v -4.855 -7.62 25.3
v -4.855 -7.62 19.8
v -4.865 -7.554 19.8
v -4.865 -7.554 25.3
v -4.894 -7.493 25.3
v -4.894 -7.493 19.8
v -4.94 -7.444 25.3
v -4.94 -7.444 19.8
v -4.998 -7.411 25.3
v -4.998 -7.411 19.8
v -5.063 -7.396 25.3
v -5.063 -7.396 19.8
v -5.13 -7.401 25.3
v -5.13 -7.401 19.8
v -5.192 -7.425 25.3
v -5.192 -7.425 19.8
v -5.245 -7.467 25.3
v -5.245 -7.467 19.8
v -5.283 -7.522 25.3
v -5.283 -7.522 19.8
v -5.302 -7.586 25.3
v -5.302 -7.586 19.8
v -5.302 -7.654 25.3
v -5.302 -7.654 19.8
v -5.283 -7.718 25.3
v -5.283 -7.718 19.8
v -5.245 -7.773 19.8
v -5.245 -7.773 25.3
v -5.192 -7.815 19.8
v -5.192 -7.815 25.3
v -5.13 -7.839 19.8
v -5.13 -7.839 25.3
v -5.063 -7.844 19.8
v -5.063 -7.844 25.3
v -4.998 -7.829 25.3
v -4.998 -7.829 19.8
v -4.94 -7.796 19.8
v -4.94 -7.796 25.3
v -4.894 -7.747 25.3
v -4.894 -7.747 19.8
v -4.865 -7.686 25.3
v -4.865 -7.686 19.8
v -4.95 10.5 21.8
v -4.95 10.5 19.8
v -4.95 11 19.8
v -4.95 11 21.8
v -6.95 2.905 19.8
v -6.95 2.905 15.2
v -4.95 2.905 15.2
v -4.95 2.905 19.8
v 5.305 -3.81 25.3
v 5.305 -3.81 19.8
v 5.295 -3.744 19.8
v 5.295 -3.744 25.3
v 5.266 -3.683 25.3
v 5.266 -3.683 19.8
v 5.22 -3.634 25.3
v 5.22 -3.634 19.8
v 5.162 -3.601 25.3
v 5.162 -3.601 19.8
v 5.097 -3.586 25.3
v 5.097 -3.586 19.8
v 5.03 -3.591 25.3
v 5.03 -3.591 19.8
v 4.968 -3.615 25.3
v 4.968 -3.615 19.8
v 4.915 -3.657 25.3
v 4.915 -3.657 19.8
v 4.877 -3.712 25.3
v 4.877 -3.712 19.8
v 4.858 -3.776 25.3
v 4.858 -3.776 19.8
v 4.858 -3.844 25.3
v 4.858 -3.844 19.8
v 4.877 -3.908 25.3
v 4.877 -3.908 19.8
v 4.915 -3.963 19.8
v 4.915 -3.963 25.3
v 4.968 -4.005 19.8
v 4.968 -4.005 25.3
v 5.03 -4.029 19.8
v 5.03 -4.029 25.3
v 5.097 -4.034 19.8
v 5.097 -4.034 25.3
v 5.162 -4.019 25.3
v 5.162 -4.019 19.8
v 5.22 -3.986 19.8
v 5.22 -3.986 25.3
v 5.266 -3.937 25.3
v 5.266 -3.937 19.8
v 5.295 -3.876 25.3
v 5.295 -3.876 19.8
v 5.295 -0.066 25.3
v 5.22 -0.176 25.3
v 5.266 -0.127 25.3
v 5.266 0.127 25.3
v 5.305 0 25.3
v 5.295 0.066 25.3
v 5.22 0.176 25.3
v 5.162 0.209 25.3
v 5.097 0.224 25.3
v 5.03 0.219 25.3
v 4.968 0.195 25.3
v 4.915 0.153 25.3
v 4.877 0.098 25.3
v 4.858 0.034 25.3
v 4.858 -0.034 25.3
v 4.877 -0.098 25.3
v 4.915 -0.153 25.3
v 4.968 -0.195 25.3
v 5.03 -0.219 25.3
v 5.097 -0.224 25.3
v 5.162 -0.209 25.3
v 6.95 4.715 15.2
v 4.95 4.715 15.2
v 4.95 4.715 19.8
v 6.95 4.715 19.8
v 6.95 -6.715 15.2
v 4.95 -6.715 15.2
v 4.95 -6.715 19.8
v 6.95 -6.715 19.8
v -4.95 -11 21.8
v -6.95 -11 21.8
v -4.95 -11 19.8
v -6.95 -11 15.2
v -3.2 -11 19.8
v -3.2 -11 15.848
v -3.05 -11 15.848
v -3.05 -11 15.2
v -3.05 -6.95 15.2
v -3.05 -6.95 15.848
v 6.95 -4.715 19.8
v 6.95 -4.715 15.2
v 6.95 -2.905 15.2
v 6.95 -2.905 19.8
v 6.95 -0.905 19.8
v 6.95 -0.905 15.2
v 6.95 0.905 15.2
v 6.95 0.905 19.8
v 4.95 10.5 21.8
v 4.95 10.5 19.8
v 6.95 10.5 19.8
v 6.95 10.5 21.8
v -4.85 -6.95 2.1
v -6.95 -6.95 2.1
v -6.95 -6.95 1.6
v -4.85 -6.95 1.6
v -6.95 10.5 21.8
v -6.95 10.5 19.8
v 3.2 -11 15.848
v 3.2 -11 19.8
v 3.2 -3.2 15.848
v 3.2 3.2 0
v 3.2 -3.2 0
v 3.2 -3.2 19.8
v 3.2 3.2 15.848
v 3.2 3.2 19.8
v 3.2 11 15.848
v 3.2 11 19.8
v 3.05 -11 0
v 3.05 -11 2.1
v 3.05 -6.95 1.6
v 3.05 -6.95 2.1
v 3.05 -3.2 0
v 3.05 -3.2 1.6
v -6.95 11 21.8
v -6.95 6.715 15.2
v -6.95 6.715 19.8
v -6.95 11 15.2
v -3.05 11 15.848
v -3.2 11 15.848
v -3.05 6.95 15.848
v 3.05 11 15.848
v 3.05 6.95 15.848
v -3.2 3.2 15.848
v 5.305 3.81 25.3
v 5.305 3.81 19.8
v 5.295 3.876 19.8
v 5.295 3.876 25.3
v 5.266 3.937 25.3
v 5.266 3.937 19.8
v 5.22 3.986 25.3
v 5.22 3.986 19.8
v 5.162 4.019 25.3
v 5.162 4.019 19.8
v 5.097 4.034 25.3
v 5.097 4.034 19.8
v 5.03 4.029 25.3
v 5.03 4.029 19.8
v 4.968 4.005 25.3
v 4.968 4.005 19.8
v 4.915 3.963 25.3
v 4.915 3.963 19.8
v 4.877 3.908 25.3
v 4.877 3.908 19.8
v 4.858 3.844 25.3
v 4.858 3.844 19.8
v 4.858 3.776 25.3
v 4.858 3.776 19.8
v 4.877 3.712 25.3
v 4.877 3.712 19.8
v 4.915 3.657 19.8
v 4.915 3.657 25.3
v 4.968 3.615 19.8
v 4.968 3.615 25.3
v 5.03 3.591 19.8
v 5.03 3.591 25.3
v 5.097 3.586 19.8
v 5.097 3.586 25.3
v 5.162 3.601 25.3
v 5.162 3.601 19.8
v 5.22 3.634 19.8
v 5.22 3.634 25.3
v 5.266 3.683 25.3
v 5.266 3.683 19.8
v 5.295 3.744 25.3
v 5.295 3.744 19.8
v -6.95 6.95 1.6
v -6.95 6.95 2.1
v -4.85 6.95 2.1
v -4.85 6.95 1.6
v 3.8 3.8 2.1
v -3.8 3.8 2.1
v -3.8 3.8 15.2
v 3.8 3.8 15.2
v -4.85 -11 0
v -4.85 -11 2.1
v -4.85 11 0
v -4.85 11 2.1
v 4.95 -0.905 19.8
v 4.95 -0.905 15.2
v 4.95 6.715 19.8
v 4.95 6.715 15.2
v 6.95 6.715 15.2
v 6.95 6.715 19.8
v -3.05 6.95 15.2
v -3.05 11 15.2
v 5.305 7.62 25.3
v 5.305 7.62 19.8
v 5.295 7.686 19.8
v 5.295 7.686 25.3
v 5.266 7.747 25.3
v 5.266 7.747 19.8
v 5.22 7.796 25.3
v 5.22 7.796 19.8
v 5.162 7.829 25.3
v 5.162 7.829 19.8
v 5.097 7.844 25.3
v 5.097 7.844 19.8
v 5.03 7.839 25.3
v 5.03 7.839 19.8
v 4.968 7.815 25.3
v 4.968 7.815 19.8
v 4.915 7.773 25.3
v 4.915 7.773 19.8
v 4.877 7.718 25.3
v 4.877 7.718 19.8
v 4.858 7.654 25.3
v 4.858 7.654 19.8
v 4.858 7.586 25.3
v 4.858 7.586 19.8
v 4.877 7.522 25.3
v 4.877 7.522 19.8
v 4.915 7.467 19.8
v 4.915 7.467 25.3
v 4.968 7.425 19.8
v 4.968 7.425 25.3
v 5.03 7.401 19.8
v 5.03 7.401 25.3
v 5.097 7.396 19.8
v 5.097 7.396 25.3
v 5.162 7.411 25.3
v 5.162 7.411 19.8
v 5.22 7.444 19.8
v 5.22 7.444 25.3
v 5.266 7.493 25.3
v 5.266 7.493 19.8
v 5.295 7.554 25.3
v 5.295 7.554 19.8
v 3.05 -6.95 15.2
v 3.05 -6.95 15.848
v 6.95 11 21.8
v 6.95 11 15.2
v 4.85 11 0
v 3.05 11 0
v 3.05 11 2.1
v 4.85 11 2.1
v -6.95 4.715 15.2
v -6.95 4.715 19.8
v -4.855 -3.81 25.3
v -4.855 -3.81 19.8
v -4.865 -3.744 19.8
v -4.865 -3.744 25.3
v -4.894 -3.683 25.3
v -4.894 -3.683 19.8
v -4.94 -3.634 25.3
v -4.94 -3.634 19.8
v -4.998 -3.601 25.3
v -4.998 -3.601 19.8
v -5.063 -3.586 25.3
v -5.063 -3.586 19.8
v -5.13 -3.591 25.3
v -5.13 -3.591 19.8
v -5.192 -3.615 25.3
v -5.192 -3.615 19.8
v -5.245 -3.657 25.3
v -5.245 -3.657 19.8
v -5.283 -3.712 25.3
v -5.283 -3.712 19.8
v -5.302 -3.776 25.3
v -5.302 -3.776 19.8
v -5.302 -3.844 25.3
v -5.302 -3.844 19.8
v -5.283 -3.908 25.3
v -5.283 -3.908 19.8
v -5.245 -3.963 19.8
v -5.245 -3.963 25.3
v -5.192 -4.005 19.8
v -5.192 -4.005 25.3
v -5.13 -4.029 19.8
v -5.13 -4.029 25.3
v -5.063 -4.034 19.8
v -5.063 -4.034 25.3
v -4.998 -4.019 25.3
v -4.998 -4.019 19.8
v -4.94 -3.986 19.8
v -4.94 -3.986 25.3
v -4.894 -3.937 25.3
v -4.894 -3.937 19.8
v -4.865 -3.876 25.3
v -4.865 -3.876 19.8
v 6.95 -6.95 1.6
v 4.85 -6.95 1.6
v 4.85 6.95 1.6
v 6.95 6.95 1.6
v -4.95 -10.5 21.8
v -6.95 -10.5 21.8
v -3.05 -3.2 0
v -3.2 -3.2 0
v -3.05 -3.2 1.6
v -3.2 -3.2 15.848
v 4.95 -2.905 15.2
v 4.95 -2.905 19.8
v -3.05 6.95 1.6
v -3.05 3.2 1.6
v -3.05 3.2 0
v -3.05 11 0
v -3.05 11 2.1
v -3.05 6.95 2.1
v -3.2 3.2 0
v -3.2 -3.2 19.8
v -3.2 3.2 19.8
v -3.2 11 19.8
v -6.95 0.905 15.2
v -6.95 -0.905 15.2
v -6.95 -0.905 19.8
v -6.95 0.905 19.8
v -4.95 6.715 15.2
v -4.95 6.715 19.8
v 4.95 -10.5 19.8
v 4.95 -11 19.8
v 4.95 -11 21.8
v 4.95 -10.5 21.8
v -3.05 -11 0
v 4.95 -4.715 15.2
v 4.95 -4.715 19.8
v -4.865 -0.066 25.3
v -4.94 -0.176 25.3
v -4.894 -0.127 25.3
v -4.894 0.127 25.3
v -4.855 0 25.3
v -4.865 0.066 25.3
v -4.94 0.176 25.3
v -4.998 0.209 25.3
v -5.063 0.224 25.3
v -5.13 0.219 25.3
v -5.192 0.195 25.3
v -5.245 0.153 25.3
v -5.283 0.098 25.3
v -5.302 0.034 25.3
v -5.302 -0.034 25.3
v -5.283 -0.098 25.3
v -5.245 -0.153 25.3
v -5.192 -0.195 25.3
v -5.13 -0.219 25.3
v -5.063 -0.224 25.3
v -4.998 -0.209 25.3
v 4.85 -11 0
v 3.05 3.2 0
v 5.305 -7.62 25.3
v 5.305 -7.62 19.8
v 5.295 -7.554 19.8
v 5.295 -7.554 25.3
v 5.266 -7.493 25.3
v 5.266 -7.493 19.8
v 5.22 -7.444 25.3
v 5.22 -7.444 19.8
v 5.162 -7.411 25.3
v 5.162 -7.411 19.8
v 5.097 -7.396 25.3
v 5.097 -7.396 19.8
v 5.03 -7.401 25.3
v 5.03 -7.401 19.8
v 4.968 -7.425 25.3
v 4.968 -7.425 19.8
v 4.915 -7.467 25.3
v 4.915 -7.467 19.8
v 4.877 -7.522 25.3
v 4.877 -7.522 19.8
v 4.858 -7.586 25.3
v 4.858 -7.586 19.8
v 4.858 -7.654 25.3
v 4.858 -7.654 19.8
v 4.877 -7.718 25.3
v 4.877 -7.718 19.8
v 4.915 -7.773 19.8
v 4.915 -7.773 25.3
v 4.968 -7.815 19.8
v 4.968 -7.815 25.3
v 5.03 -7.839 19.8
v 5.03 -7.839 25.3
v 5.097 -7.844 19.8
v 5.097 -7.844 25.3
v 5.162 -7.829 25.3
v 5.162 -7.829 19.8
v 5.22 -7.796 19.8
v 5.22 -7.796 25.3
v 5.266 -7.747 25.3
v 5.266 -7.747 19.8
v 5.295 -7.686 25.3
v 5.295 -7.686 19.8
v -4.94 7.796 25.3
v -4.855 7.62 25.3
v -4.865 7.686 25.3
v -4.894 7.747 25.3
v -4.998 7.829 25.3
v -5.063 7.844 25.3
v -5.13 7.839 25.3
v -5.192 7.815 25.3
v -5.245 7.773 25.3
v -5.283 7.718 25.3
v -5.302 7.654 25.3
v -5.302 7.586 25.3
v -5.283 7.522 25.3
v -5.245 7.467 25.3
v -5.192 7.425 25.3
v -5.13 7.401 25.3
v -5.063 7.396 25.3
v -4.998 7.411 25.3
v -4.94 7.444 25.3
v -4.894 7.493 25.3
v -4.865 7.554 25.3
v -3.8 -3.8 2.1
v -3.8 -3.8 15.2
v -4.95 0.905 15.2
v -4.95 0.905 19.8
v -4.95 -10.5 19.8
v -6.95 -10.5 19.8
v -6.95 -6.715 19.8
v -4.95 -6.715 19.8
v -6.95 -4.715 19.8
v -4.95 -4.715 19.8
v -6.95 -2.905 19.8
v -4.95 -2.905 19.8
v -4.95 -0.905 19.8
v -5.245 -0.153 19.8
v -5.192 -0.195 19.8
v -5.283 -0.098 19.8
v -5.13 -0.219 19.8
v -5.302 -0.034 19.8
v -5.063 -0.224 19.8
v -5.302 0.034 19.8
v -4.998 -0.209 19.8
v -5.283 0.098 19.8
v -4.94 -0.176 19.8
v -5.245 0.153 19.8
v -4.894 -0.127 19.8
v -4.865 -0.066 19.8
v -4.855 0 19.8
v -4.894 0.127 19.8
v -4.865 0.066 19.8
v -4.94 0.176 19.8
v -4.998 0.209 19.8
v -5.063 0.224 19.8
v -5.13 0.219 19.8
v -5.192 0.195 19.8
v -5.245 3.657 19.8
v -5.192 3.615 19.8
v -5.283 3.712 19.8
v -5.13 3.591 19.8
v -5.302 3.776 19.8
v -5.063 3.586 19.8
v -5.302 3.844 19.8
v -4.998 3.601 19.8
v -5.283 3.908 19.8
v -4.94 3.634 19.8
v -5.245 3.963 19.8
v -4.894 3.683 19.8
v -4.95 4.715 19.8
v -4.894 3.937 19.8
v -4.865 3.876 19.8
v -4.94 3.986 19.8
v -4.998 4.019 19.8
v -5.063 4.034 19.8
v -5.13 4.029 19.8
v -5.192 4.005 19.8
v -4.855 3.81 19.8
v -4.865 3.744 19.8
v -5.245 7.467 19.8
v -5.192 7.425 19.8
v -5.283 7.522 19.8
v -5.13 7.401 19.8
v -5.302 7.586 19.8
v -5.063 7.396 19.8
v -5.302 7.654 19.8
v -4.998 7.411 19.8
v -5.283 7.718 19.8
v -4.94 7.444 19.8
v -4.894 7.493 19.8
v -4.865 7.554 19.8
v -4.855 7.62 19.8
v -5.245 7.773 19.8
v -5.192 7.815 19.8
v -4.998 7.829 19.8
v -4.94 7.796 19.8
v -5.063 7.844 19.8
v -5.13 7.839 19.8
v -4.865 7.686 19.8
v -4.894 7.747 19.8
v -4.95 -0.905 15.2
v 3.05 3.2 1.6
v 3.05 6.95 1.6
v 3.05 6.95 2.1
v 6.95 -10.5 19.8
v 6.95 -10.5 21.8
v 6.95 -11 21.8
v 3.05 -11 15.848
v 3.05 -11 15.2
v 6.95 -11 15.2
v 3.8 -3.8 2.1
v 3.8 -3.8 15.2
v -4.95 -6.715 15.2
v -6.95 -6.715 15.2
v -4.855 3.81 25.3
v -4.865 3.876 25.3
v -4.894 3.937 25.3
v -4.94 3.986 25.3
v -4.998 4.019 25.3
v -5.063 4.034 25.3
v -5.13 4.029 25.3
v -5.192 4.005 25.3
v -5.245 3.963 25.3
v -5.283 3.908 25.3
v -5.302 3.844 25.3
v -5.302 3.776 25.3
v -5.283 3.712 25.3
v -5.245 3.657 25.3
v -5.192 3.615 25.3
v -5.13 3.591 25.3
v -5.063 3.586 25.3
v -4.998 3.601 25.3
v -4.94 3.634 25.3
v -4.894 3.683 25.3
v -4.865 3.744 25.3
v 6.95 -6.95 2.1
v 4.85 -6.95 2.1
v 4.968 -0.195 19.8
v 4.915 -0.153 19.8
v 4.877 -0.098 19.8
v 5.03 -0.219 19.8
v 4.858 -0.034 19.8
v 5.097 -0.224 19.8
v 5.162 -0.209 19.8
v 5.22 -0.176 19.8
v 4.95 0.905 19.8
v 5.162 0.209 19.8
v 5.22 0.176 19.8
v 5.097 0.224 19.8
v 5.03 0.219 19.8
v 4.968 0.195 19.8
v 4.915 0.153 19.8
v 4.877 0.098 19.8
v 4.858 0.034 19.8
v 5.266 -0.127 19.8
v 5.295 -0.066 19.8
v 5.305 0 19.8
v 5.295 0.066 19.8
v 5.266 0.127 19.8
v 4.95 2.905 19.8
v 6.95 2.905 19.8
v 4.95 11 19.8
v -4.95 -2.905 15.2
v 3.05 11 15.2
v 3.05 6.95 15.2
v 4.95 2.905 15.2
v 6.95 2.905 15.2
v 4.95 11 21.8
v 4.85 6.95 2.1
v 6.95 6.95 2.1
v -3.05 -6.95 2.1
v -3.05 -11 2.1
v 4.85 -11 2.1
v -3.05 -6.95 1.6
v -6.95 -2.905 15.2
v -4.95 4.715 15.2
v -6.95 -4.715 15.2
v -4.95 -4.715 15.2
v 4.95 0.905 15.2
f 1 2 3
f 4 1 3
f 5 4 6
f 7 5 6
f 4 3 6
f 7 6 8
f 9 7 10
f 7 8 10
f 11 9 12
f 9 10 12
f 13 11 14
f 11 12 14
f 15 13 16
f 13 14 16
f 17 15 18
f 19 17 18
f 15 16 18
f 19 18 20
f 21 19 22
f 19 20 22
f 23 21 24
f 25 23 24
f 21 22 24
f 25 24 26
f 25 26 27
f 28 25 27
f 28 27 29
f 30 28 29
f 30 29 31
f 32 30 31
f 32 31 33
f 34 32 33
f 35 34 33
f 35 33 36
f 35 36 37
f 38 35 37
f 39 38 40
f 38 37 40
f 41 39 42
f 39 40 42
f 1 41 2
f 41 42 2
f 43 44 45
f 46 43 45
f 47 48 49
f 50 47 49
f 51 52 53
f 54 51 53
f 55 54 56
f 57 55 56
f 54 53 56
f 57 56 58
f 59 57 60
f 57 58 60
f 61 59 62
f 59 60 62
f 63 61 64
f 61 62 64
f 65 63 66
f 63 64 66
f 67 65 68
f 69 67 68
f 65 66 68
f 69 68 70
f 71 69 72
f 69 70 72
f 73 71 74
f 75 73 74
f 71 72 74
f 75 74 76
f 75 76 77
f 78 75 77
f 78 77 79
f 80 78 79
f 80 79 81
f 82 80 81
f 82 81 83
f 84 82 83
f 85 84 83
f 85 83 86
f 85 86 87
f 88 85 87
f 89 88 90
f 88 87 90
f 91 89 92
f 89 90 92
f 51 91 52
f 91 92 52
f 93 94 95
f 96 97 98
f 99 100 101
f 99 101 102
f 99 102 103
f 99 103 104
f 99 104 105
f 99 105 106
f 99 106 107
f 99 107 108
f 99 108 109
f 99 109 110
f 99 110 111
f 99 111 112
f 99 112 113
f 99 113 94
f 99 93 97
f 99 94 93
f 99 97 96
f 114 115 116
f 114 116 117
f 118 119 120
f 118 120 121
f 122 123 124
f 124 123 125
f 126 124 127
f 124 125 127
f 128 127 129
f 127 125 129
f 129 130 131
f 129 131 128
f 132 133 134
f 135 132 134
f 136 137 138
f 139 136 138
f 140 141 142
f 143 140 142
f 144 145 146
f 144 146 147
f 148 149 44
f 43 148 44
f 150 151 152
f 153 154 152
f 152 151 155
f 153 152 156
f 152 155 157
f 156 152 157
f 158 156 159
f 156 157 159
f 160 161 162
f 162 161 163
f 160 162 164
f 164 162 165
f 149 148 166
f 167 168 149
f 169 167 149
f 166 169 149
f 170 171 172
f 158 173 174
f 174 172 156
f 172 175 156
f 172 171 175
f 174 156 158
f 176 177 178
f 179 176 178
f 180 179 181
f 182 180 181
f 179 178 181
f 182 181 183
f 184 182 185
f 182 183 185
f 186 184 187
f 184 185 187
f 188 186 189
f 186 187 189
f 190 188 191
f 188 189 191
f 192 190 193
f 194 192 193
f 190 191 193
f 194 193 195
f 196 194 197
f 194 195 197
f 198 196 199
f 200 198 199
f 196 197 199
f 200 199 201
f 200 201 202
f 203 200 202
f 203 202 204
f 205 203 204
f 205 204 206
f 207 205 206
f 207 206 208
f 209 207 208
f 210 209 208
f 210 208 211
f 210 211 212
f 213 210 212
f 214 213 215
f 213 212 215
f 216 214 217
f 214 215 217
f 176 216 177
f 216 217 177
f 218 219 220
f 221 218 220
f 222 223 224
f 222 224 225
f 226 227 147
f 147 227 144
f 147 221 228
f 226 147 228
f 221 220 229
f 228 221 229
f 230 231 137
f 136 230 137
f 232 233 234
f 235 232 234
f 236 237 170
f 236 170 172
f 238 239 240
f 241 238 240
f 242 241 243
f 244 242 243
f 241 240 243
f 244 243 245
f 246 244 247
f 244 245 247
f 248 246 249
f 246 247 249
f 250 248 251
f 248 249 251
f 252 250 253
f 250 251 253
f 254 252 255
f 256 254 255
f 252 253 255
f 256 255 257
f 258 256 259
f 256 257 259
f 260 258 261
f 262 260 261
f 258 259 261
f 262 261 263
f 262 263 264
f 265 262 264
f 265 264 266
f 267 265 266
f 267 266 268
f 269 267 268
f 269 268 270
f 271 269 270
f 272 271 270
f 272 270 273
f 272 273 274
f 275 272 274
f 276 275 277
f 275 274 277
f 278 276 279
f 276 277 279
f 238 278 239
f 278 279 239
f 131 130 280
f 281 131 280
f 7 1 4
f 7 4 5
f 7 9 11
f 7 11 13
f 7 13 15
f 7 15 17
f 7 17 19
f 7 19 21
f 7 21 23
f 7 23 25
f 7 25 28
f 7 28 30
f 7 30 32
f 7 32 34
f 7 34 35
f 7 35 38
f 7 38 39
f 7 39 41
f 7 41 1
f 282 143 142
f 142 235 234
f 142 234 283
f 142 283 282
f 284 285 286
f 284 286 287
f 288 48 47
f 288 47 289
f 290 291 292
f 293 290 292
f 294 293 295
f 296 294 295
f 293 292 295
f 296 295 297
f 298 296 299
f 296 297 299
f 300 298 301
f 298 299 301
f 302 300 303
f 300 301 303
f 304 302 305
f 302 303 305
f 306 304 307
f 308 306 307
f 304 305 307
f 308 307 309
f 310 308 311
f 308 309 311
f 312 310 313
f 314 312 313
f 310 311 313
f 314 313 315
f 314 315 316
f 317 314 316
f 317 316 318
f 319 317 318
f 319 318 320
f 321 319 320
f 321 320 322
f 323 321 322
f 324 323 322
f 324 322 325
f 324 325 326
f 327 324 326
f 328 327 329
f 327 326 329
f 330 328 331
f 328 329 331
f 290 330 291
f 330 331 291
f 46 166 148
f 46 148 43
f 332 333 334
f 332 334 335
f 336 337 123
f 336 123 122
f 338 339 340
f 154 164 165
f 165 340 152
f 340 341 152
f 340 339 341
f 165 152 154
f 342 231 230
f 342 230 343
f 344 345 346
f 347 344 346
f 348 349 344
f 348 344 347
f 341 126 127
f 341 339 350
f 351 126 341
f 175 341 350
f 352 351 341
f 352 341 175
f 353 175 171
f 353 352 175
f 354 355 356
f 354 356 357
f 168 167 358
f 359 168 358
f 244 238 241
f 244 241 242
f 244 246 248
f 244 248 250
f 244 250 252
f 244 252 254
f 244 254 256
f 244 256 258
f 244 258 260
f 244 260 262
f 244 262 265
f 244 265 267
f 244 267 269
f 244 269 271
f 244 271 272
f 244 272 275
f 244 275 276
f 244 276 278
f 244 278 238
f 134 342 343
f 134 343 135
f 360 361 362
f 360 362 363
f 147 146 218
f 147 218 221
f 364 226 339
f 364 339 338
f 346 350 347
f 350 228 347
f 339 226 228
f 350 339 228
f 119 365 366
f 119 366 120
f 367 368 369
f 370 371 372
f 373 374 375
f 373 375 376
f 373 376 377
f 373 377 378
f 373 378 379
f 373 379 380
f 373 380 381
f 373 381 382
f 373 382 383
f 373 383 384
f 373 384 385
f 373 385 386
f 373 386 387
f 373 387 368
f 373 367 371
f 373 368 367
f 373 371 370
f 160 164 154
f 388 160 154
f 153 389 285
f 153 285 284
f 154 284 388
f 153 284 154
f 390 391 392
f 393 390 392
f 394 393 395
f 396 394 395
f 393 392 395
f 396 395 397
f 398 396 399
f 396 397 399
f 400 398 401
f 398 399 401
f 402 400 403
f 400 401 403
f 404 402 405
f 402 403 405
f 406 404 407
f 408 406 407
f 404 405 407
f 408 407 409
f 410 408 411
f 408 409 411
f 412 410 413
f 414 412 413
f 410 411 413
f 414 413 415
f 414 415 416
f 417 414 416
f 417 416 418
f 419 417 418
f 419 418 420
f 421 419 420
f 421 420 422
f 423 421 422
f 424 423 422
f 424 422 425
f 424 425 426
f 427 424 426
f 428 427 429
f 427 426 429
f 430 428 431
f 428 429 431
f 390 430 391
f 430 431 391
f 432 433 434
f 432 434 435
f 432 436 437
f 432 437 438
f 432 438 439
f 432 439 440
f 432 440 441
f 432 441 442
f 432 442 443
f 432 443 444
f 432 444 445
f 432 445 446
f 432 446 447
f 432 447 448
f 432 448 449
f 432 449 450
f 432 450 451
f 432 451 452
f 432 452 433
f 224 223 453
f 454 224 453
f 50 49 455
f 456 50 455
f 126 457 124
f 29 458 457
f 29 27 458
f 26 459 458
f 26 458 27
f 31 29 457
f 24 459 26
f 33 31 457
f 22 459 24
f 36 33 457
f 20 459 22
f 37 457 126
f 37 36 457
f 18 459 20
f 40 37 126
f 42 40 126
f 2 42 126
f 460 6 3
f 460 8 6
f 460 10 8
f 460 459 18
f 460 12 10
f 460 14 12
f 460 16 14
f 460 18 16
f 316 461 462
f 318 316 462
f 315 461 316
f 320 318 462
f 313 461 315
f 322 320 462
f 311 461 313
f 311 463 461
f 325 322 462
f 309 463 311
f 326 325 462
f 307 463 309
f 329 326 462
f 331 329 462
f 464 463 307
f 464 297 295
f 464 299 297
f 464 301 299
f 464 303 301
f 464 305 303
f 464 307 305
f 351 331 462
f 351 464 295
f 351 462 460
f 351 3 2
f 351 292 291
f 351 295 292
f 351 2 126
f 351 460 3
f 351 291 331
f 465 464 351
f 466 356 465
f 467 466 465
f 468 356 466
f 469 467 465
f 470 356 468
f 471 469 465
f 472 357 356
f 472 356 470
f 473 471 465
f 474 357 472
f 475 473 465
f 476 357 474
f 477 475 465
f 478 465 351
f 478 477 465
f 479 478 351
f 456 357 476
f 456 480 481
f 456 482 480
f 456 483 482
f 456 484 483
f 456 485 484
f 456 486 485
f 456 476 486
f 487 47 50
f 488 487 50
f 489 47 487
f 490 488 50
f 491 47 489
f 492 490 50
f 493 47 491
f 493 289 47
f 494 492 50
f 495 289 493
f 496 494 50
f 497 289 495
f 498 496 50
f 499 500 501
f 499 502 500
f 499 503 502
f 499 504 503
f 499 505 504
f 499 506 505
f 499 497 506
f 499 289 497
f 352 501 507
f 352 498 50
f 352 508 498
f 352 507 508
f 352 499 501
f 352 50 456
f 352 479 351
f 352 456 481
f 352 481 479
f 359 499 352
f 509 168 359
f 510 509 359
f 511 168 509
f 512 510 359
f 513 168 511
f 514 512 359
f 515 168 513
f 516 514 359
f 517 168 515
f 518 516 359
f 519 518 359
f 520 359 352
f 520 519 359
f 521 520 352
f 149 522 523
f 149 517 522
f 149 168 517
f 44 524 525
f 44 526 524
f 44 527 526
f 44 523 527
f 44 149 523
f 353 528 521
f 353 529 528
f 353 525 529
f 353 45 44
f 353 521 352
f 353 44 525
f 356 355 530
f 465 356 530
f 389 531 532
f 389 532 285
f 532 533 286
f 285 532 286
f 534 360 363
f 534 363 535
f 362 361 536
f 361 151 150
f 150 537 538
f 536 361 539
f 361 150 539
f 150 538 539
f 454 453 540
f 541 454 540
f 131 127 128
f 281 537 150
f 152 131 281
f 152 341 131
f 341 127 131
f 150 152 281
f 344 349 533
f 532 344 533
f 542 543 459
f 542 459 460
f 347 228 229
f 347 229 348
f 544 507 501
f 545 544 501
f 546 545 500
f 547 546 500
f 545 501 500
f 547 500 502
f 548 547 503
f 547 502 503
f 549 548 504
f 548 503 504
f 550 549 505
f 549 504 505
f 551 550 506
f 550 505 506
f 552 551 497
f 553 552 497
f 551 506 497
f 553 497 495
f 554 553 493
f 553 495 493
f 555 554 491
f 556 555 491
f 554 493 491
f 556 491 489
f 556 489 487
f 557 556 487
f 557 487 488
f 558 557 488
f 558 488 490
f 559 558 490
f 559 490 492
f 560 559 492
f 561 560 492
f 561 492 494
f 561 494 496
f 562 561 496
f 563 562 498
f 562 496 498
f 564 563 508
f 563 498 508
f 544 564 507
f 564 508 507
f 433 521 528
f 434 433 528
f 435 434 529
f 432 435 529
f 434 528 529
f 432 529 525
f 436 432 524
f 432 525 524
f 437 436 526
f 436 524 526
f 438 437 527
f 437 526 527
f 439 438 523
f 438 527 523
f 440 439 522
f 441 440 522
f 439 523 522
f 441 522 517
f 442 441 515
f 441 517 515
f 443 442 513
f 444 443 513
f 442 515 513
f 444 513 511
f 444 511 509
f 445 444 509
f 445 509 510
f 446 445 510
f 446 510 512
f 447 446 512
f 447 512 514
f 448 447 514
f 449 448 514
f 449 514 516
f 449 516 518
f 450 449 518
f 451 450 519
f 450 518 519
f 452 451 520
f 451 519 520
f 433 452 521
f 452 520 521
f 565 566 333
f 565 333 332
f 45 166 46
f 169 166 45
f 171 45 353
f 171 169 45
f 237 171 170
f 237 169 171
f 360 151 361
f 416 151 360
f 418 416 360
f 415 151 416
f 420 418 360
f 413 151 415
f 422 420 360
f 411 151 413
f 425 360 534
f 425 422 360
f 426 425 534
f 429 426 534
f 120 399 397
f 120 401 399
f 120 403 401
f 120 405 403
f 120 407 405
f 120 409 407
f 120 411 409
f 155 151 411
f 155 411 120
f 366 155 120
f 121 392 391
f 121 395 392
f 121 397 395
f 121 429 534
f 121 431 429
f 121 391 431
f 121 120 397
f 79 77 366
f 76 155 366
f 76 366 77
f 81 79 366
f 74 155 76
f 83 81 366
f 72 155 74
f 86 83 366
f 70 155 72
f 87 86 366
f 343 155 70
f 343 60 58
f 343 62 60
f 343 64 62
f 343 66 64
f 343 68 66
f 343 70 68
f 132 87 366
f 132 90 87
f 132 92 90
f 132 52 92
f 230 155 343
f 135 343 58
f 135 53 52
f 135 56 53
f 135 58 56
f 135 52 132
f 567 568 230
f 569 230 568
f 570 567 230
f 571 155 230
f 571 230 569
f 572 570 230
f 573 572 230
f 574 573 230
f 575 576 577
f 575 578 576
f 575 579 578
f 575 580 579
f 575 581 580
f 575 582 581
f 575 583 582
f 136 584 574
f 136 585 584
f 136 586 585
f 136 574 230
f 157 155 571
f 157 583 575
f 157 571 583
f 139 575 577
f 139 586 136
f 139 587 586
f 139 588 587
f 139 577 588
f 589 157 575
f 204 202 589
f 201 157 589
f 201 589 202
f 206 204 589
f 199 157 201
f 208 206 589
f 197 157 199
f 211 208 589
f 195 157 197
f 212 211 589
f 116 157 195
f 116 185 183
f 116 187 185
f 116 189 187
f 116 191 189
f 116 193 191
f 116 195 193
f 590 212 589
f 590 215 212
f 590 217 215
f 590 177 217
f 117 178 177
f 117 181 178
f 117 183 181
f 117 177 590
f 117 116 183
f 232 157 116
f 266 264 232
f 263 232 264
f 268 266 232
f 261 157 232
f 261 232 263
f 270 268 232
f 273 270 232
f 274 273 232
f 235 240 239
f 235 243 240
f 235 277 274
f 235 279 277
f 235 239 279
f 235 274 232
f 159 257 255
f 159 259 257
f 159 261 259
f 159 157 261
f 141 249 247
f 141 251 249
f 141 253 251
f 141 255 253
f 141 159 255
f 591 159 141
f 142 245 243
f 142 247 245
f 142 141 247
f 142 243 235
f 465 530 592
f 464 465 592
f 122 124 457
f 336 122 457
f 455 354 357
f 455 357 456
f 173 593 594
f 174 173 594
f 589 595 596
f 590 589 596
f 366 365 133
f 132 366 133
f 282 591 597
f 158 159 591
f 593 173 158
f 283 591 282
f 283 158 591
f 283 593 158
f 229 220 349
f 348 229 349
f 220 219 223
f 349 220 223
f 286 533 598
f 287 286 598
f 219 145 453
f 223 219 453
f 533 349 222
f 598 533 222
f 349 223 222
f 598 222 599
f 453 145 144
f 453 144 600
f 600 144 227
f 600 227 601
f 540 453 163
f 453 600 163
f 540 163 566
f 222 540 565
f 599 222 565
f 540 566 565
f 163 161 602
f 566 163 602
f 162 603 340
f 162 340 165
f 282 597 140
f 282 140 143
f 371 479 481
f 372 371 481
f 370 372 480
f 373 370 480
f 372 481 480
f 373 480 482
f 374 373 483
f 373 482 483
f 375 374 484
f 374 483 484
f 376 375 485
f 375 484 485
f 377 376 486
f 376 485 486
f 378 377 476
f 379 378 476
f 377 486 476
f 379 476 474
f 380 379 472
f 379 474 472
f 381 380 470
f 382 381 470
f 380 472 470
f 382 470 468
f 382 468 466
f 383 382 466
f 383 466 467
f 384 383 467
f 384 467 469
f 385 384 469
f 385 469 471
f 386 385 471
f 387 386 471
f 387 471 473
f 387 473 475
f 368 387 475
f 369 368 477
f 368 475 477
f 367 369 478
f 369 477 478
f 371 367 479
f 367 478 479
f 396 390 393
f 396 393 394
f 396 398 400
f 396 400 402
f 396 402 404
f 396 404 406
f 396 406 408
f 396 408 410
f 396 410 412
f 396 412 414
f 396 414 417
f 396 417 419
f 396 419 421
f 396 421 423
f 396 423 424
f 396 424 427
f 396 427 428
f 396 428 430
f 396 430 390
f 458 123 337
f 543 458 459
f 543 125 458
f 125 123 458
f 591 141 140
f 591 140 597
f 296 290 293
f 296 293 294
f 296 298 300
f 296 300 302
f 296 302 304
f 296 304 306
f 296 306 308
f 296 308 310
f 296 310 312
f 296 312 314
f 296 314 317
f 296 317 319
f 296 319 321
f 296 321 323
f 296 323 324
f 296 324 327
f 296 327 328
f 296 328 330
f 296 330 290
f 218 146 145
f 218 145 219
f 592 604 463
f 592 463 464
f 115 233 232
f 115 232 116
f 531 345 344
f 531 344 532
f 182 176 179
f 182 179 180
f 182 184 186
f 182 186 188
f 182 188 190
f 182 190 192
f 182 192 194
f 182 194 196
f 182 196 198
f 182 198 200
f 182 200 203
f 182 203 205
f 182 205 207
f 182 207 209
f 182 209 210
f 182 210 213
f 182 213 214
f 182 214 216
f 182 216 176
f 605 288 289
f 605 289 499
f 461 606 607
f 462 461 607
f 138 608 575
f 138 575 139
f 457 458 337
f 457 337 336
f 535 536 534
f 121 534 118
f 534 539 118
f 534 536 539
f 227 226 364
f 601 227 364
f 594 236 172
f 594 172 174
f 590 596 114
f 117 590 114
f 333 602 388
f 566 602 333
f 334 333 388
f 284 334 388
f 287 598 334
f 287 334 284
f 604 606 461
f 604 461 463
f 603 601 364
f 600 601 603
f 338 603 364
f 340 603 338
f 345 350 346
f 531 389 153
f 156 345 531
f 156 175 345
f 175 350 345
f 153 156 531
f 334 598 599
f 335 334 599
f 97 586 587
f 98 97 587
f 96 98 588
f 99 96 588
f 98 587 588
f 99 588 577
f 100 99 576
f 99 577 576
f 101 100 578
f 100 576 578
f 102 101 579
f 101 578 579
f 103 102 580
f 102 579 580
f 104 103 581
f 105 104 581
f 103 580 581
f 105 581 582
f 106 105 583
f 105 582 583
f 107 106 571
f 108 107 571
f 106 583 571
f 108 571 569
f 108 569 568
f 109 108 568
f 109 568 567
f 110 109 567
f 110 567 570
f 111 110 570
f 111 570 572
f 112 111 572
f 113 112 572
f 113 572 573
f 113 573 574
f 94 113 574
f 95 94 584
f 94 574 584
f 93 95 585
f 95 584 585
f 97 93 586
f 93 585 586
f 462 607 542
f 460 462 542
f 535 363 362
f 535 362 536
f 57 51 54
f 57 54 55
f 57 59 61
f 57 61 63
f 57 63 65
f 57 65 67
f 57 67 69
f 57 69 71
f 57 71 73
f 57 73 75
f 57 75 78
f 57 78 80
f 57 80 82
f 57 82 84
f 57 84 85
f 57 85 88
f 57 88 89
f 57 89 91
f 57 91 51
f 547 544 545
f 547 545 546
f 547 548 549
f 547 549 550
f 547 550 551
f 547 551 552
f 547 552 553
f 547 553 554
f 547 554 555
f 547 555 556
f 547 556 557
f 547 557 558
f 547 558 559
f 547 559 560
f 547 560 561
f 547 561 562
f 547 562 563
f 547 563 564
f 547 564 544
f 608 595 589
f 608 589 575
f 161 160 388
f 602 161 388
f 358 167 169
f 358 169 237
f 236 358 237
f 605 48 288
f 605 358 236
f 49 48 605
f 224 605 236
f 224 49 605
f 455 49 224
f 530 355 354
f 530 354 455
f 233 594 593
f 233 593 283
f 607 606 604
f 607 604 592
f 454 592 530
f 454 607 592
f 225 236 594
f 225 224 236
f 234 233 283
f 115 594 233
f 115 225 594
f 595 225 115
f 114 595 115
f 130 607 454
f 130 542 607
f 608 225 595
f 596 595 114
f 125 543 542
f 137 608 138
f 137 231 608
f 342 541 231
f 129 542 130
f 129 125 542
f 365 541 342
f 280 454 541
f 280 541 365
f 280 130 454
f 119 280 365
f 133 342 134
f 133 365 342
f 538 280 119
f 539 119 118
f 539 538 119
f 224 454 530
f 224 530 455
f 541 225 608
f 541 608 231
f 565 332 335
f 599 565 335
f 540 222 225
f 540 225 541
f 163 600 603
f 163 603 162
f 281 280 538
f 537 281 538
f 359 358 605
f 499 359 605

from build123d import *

# Parameters (mm, degrees)
F0_W           = 13.9
F0_H           = 22
F1_DEPTH       = 19.8
F4_W           = 13.9
F4_H           = 22
F4_W_2         = 7.6
F4_H_2         = 7.6
F5_DEPTH       = 13.1
F6_W           = 6.4
F6_H           = 6.4
F7_DEPTH       = 19.801
F8_W           = 2.1
F8_H           = 22
F8_W_2         = 6.1
F9_DEPTH       = 1.6
F10_W          = 2.1
F10_H          = 4.05
F10_W_2        = 6.1
F11_DEPTH      = 0.5
F12_W          = 6.1
F12_H          = 4.05
F12_W_2        = 2
F12_H_2        = 2
F13_DEPTH      = 4.6
F14_W          = 6.4
F14_H          = 3.9517926995
F15_DEPTH      = 11.001
F15_DEPTH_BACK = 11.001
F16_R          = 0.225
F17_DEPTH      = 5.5
F18_W          = 2
F18_H          = 0.5
F19_DEPTH      = 2


with BuildPart() as f1:
    # F0 (on Top) → F1 (new body)
    with BuildSketch(Plane.XY):
        Rectangle(F0_W, F0_H)
    extrude(amount=F1_DEPTH)

    # F4 (on offset) → F5 (cut, through all)
    with BuildSketch(Plane(origin=(0, 0, 2.1), x_dir=(1, 0, 0), z_dir=(0, 0, -1))):
        Rectangle(F4_W, F4_H)
        Rectangle(F4_W_2, F4_H_2, mode=Mode.SUBTRACT)
    extrude(amount=-F5_DEPTH, mode=Mode.SUBTRACT)

    # F6 (on face) → F7 (cut, through all)
    with BuildSketch(Plane.XY.offset(19.8)):
        Rectangle(F6_W, F6_H)
    extrude(amount=-F7_DEPTH, mode=Mode.SUBTRACT)

    # F8 (on face) → F9 (cut)
    with BuildSketch(Plane(origin=(0, 0, 0), x_dir=(1, 0, 0), z_dir=(0, 0, -1))):
        with Locations((-5.9, 0)):
            Rectangle(F8_W, F8_H)
        Rectangle(F8_W_2, F8_H)
        with Locations((5.9, 0)):
            Rectangle(F8_W, F8_H)
    extrude(amount=-F9_DEPTH, mode=Mode.SUBTRACT)

    # F10 (on face) → F11 (cut, through all)
    with BuildSketch(Plane.XY.offset(2.1)):
        with Locations((5.9, 8.975)):
            Rectangle(F10_W, F10_H)
        with Locations((5.9, -8.975)):
            Rectangle(F10_W, F10_H)
        with Locations((0, -8.975)):
            Rectangle(F10_W_2, F10_H)
        with Locations((-5.9, -8.975)):
            Rectangle(F10_W, F10_H)
        with Locations((-5.9, 8.975)):
            Rectangle(F10_W, F10_H)
        with Locations((0, 8.975)):
            Rectangle(F10_W_2, F10_H)
    extrude(amount=-F11_DEPTH, mode=Mode.SUBTRACT)

    # F12 (on face) → F13 (cut, through all)
    with BuildSketch(Plane(origin=(0, 0, 15.2), x_dir=(1, 0, 0), z_dir=(0, 0, -1))):
        with Locations((0, -8.975)):
            Rectangle(F12_W, F12_H)
        with Locations((5.95, -5.715)):
            Rectangle(F12_W_2, F12_H_2)
        with Locations((5.95, -1.905)):
            Rectangle(F12_W_2, F12_H_2)
        with Locations((5.95, 1.905)):
            Rectangle(F12_W_2, F12_H_2)
        with Locations((5.95, 5.715)):
            Rectangle(F12_W_2, F12_H_2)
        with Locations((-5.95, 5.715)):
            Rectangle(F12_W_2, F12_H_2)
        with Locations((0, 8.975)):
            Rectangle(F12_W, F12_H)
        with Locations((-5.95, 1.905)):
            Rectangle(F12_W_2, F12_H_2)
        with Locations((-5.95, -1.905)):
            Rectangle(F12_W_2, F12_H_2)
        with Locations((-5.95, -5.715)):
            Rectangle(F12_W_2, F12_H_2)
    extrude(amount=-F13_DEPTH, mode=Mode.SUBTRACT)

    # F14 (on Front) → F15 (cut, two sides)
    with BuildSketch(Plane.XZ) as f15_sk:
        with Locations((0, 17.8241036503)):
            Rectangle(F14_W, F14_H)
    extrude(amount=-F15_DEPTH, mode=Mode.SUBTRACT)
    extrude(f15_sk.sketch, amount=F15_DEPTH_BACK, mode=Mode.SUBTRACT)

    # F16 (on face) → F17 (join)
    with BuildSketch(Plane.XY.offset(19.8)):
        with Locations((5.08, 7.62)):
            Circle(F16_R)
        with Locations((5.08, 3.81)):
            Circle(F16_R)
        with Locations((5.08, 0)):
            Circle(F16_R)
        with Locations((5.08, -3.81)):
            Circle(F16_R)
        with Locations((5.08, -7.62)):
            Circle(F16_R)
        with Locations((-5.08, -7.62)):
            Circle(F16_R)
        with Locations((-5.08, -3.81)):
            Circle(F16_R)
        with Locations((-5.08, 0)):
            Circle(F16_R)
        with Locations((-5.08, 3.81)):
            Circle(F16_R)
        with Locations((-5.08, 7.62)):
            Circle(F16_R)
    extrude(amount=F17_DEPTH)

    # F18 (on face) → F19 (join)
    with BuildSketch(Plane.XY.offset(19.8)):
        with Locations((-5.95, 10.75)):
            Rectangle(F18_W, F18_H)
        with Locations((-5.95, -10.75)):
            Rectangle(F18_W, F18_H)
        with Locations((5.95, -10.75)):
            Rectangle(F18_W, F18_H)
        with Locations((5.95, 10.75)):
            Rectangle(F18_W, F18_H)
    extrude(amount=F19_DEPTH)


solid = f1.part
